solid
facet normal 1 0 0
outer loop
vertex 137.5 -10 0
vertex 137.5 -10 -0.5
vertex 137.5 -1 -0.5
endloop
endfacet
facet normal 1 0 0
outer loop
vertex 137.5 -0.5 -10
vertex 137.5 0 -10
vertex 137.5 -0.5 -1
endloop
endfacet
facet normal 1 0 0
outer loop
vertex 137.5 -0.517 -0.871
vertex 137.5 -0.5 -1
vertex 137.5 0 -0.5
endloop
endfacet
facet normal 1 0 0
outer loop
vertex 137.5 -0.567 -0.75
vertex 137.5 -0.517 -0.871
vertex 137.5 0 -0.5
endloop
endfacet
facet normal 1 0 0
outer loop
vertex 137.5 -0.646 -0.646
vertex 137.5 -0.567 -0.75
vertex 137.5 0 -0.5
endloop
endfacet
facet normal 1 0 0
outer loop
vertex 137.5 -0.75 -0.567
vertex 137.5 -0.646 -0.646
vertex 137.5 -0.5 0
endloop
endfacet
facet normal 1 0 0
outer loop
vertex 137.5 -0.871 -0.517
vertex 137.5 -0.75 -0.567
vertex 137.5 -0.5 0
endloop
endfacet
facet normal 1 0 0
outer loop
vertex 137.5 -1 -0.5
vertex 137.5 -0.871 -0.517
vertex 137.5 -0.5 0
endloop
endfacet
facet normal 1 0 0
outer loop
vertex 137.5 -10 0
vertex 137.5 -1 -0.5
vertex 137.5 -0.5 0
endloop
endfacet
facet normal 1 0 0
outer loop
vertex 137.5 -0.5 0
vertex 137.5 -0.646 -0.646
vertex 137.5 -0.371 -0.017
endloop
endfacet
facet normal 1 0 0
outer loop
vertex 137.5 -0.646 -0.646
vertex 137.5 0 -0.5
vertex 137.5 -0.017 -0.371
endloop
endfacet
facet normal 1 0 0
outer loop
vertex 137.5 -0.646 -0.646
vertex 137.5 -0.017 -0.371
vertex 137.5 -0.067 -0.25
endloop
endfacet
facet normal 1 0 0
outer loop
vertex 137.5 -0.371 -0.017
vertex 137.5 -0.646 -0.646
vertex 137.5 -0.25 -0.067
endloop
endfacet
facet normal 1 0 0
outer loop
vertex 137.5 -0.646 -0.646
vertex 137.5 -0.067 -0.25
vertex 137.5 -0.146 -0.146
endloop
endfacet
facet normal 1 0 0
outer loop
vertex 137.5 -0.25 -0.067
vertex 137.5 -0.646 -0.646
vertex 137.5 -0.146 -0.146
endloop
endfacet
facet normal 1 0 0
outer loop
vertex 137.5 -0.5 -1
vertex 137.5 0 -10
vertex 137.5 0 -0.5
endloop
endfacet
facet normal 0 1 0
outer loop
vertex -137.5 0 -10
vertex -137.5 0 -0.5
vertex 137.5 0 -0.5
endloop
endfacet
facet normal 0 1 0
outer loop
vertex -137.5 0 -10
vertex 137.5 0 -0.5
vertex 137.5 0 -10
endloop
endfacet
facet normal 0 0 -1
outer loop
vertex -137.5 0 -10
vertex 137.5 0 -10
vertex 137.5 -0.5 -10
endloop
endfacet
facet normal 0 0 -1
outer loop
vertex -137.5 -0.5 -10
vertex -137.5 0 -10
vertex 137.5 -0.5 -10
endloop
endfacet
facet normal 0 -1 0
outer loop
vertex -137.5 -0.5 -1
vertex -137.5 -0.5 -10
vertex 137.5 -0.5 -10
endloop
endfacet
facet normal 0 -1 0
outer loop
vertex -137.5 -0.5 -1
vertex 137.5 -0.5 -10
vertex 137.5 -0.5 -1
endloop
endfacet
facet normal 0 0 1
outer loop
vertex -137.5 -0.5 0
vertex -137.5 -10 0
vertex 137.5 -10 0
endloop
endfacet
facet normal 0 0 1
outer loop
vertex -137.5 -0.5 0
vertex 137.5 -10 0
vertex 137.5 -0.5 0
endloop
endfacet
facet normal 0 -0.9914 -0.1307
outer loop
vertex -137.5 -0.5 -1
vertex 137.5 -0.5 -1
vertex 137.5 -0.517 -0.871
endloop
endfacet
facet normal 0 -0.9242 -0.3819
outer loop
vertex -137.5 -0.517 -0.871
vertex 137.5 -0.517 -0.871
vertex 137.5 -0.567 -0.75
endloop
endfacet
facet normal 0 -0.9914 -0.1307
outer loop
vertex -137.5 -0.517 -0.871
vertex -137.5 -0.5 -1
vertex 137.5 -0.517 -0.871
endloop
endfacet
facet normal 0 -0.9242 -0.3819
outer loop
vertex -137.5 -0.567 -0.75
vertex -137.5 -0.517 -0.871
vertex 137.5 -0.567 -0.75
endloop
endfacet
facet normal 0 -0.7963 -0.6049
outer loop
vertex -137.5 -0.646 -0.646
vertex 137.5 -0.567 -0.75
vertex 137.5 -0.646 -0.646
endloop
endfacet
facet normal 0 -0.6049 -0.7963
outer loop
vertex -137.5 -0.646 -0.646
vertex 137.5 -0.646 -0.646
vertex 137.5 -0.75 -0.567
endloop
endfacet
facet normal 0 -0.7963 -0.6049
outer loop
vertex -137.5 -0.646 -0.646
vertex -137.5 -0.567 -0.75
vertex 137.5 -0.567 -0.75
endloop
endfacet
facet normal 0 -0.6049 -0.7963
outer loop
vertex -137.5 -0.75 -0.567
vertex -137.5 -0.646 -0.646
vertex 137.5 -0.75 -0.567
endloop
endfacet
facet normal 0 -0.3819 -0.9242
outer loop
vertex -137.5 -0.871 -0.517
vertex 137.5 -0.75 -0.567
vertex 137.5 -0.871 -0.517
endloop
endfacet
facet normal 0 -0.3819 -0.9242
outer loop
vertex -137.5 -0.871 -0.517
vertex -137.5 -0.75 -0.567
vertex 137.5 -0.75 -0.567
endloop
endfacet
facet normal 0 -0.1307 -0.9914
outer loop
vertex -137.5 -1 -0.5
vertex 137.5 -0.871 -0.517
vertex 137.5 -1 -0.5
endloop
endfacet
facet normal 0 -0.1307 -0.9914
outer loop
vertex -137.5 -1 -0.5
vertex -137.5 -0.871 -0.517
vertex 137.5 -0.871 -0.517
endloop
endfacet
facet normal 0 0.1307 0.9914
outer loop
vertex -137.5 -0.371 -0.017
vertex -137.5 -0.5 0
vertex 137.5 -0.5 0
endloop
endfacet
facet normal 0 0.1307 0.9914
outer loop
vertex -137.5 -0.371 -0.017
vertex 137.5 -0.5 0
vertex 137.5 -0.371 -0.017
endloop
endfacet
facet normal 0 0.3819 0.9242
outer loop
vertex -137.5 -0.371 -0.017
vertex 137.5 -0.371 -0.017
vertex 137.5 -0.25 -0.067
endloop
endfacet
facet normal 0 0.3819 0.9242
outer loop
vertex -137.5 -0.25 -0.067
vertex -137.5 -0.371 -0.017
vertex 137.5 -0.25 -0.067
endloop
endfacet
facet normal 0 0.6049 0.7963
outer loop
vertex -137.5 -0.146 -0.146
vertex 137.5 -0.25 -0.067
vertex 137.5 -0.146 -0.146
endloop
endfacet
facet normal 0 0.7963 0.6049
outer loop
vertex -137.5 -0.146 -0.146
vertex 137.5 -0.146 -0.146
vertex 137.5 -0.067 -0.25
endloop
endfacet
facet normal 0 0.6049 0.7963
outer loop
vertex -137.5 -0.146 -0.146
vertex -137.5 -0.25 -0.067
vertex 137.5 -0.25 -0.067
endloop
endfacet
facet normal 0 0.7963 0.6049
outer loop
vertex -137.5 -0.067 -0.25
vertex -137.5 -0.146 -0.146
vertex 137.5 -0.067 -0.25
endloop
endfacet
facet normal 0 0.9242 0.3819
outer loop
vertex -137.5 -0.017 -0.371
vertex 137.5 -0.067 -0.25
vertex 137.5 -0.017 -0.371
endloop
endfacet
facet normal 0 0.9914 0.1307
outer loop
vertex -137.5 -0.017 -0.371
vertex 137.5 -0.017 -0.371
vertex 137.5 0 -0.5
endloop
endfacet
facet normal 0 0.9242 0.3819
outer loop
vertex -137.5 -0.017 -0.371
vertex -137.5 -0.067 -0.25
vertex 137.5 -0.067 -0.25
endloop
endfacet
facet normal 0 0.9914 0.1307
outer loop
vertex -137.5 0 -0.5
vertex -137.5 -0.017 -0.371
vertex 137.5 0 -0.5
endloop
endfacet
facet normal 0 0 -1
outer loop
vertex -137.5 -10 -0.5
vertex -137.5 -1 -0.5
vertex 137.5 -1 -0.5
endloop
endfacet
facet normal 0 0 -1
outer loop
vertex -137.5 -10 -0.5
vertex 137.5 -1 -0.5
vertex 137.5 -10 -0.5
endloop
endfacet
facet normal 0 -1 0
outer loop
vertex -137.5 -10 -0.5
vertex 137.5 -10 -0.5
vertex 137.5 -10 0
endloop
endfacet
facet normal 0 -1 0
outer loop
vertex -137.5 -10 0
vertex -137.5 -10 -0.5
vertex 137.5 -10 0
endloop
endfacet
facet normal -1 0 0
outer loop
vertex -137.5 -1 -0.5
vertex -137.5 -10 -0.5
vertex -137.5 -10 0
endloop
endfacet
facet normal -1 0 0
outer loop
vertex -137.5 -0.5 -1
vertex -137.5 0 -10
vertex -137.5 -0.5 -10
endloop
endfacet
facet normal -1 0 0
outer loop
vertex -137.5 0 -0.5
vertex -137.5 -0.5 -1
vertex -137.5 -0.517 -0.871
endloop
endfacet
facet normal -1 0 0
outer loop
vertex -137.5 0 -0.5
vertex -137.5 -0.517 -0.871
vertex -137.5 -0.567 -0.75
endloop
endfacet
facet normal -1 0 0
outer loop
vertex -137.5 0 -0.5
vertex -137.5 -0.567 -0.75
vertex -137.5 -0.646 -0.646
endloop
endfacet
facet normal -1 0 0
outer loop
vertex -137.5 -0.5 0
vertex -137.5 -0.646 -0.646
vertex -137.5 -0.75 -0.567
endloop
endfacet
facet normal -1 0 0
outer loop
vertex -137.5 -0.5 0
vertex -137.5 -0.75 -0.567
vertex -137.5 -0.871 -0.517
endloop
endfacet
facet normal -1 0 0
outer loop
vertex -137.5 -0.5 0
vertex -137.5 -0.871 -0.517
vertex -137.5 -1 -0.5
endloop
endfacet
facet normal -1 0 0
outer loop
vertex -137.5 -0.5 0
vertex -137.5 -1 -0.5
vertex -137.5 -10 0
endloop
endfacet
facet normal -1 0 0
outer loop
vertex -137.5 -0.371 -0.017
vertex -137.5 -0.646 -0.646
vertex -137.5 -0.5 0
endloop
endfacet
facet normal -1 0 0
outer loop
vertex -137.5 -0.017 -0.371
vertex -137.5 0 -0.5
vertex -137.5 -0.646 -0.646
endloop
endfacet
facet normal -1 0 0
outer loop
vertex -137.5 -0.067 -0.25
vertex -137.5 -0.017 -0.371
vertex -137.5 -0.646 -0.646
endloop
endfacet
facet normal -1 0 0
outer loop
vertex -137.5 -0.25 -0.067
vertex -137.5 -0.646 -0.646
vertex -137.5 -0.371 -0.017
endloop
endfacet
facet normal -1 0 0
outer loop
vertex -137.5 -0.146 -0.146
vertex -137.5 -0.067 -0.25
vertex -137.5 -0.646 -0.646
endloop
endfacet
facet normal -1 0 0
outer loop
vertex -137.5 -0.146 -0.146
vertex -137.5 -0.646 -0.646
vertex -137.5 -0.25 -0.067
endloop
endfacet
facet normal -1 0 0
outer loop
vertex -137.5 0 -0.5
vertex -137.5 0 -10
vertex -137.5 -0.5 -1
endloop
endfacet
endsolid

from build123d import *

# Parameters (mm, degrees)
BOSS_EXTRUDE1_DEPTH      = 137.5
BOSS_EXTRUDE1_DEPTH_BACK = 137.5


with BuildPart() as part:
    # Sketch1 → Boss-Extrude1 (new, two sides: drawn at the far end of the back side and taken through both)
    with BuildSketch(Plane(origin=(0, 0, 0), x_dir=(0, 0, -1), z_dir=(1, 0, 0)).offset(-BOSS_EXTRUDE1_DEPTH_BACK)):
        with BuildLine():
            Line((0, -10), (0, -0.5))
            ThreePointArc((0, -0.5), (0.146446609, -0.146446609), (0.5, 0))
            Line((0.5, 0), (10, 0))
            Line((10, 0), (10, -0.5))
            Line((10, -0.5), (1, -0.5))
            ThreePointArc((1, -0.5), (0.646446609, -0.646446609), (0.5, -1))
            Line((0.5, -1), (0.5, -10))
            Line((0.5, -10), (0, -10))
        make_face()
    extrude(amount=BOSS_EXTRUDE1_DEPTH + BOSS_EXTRUDE1_DEPTH_BACK)


solid = part.part
